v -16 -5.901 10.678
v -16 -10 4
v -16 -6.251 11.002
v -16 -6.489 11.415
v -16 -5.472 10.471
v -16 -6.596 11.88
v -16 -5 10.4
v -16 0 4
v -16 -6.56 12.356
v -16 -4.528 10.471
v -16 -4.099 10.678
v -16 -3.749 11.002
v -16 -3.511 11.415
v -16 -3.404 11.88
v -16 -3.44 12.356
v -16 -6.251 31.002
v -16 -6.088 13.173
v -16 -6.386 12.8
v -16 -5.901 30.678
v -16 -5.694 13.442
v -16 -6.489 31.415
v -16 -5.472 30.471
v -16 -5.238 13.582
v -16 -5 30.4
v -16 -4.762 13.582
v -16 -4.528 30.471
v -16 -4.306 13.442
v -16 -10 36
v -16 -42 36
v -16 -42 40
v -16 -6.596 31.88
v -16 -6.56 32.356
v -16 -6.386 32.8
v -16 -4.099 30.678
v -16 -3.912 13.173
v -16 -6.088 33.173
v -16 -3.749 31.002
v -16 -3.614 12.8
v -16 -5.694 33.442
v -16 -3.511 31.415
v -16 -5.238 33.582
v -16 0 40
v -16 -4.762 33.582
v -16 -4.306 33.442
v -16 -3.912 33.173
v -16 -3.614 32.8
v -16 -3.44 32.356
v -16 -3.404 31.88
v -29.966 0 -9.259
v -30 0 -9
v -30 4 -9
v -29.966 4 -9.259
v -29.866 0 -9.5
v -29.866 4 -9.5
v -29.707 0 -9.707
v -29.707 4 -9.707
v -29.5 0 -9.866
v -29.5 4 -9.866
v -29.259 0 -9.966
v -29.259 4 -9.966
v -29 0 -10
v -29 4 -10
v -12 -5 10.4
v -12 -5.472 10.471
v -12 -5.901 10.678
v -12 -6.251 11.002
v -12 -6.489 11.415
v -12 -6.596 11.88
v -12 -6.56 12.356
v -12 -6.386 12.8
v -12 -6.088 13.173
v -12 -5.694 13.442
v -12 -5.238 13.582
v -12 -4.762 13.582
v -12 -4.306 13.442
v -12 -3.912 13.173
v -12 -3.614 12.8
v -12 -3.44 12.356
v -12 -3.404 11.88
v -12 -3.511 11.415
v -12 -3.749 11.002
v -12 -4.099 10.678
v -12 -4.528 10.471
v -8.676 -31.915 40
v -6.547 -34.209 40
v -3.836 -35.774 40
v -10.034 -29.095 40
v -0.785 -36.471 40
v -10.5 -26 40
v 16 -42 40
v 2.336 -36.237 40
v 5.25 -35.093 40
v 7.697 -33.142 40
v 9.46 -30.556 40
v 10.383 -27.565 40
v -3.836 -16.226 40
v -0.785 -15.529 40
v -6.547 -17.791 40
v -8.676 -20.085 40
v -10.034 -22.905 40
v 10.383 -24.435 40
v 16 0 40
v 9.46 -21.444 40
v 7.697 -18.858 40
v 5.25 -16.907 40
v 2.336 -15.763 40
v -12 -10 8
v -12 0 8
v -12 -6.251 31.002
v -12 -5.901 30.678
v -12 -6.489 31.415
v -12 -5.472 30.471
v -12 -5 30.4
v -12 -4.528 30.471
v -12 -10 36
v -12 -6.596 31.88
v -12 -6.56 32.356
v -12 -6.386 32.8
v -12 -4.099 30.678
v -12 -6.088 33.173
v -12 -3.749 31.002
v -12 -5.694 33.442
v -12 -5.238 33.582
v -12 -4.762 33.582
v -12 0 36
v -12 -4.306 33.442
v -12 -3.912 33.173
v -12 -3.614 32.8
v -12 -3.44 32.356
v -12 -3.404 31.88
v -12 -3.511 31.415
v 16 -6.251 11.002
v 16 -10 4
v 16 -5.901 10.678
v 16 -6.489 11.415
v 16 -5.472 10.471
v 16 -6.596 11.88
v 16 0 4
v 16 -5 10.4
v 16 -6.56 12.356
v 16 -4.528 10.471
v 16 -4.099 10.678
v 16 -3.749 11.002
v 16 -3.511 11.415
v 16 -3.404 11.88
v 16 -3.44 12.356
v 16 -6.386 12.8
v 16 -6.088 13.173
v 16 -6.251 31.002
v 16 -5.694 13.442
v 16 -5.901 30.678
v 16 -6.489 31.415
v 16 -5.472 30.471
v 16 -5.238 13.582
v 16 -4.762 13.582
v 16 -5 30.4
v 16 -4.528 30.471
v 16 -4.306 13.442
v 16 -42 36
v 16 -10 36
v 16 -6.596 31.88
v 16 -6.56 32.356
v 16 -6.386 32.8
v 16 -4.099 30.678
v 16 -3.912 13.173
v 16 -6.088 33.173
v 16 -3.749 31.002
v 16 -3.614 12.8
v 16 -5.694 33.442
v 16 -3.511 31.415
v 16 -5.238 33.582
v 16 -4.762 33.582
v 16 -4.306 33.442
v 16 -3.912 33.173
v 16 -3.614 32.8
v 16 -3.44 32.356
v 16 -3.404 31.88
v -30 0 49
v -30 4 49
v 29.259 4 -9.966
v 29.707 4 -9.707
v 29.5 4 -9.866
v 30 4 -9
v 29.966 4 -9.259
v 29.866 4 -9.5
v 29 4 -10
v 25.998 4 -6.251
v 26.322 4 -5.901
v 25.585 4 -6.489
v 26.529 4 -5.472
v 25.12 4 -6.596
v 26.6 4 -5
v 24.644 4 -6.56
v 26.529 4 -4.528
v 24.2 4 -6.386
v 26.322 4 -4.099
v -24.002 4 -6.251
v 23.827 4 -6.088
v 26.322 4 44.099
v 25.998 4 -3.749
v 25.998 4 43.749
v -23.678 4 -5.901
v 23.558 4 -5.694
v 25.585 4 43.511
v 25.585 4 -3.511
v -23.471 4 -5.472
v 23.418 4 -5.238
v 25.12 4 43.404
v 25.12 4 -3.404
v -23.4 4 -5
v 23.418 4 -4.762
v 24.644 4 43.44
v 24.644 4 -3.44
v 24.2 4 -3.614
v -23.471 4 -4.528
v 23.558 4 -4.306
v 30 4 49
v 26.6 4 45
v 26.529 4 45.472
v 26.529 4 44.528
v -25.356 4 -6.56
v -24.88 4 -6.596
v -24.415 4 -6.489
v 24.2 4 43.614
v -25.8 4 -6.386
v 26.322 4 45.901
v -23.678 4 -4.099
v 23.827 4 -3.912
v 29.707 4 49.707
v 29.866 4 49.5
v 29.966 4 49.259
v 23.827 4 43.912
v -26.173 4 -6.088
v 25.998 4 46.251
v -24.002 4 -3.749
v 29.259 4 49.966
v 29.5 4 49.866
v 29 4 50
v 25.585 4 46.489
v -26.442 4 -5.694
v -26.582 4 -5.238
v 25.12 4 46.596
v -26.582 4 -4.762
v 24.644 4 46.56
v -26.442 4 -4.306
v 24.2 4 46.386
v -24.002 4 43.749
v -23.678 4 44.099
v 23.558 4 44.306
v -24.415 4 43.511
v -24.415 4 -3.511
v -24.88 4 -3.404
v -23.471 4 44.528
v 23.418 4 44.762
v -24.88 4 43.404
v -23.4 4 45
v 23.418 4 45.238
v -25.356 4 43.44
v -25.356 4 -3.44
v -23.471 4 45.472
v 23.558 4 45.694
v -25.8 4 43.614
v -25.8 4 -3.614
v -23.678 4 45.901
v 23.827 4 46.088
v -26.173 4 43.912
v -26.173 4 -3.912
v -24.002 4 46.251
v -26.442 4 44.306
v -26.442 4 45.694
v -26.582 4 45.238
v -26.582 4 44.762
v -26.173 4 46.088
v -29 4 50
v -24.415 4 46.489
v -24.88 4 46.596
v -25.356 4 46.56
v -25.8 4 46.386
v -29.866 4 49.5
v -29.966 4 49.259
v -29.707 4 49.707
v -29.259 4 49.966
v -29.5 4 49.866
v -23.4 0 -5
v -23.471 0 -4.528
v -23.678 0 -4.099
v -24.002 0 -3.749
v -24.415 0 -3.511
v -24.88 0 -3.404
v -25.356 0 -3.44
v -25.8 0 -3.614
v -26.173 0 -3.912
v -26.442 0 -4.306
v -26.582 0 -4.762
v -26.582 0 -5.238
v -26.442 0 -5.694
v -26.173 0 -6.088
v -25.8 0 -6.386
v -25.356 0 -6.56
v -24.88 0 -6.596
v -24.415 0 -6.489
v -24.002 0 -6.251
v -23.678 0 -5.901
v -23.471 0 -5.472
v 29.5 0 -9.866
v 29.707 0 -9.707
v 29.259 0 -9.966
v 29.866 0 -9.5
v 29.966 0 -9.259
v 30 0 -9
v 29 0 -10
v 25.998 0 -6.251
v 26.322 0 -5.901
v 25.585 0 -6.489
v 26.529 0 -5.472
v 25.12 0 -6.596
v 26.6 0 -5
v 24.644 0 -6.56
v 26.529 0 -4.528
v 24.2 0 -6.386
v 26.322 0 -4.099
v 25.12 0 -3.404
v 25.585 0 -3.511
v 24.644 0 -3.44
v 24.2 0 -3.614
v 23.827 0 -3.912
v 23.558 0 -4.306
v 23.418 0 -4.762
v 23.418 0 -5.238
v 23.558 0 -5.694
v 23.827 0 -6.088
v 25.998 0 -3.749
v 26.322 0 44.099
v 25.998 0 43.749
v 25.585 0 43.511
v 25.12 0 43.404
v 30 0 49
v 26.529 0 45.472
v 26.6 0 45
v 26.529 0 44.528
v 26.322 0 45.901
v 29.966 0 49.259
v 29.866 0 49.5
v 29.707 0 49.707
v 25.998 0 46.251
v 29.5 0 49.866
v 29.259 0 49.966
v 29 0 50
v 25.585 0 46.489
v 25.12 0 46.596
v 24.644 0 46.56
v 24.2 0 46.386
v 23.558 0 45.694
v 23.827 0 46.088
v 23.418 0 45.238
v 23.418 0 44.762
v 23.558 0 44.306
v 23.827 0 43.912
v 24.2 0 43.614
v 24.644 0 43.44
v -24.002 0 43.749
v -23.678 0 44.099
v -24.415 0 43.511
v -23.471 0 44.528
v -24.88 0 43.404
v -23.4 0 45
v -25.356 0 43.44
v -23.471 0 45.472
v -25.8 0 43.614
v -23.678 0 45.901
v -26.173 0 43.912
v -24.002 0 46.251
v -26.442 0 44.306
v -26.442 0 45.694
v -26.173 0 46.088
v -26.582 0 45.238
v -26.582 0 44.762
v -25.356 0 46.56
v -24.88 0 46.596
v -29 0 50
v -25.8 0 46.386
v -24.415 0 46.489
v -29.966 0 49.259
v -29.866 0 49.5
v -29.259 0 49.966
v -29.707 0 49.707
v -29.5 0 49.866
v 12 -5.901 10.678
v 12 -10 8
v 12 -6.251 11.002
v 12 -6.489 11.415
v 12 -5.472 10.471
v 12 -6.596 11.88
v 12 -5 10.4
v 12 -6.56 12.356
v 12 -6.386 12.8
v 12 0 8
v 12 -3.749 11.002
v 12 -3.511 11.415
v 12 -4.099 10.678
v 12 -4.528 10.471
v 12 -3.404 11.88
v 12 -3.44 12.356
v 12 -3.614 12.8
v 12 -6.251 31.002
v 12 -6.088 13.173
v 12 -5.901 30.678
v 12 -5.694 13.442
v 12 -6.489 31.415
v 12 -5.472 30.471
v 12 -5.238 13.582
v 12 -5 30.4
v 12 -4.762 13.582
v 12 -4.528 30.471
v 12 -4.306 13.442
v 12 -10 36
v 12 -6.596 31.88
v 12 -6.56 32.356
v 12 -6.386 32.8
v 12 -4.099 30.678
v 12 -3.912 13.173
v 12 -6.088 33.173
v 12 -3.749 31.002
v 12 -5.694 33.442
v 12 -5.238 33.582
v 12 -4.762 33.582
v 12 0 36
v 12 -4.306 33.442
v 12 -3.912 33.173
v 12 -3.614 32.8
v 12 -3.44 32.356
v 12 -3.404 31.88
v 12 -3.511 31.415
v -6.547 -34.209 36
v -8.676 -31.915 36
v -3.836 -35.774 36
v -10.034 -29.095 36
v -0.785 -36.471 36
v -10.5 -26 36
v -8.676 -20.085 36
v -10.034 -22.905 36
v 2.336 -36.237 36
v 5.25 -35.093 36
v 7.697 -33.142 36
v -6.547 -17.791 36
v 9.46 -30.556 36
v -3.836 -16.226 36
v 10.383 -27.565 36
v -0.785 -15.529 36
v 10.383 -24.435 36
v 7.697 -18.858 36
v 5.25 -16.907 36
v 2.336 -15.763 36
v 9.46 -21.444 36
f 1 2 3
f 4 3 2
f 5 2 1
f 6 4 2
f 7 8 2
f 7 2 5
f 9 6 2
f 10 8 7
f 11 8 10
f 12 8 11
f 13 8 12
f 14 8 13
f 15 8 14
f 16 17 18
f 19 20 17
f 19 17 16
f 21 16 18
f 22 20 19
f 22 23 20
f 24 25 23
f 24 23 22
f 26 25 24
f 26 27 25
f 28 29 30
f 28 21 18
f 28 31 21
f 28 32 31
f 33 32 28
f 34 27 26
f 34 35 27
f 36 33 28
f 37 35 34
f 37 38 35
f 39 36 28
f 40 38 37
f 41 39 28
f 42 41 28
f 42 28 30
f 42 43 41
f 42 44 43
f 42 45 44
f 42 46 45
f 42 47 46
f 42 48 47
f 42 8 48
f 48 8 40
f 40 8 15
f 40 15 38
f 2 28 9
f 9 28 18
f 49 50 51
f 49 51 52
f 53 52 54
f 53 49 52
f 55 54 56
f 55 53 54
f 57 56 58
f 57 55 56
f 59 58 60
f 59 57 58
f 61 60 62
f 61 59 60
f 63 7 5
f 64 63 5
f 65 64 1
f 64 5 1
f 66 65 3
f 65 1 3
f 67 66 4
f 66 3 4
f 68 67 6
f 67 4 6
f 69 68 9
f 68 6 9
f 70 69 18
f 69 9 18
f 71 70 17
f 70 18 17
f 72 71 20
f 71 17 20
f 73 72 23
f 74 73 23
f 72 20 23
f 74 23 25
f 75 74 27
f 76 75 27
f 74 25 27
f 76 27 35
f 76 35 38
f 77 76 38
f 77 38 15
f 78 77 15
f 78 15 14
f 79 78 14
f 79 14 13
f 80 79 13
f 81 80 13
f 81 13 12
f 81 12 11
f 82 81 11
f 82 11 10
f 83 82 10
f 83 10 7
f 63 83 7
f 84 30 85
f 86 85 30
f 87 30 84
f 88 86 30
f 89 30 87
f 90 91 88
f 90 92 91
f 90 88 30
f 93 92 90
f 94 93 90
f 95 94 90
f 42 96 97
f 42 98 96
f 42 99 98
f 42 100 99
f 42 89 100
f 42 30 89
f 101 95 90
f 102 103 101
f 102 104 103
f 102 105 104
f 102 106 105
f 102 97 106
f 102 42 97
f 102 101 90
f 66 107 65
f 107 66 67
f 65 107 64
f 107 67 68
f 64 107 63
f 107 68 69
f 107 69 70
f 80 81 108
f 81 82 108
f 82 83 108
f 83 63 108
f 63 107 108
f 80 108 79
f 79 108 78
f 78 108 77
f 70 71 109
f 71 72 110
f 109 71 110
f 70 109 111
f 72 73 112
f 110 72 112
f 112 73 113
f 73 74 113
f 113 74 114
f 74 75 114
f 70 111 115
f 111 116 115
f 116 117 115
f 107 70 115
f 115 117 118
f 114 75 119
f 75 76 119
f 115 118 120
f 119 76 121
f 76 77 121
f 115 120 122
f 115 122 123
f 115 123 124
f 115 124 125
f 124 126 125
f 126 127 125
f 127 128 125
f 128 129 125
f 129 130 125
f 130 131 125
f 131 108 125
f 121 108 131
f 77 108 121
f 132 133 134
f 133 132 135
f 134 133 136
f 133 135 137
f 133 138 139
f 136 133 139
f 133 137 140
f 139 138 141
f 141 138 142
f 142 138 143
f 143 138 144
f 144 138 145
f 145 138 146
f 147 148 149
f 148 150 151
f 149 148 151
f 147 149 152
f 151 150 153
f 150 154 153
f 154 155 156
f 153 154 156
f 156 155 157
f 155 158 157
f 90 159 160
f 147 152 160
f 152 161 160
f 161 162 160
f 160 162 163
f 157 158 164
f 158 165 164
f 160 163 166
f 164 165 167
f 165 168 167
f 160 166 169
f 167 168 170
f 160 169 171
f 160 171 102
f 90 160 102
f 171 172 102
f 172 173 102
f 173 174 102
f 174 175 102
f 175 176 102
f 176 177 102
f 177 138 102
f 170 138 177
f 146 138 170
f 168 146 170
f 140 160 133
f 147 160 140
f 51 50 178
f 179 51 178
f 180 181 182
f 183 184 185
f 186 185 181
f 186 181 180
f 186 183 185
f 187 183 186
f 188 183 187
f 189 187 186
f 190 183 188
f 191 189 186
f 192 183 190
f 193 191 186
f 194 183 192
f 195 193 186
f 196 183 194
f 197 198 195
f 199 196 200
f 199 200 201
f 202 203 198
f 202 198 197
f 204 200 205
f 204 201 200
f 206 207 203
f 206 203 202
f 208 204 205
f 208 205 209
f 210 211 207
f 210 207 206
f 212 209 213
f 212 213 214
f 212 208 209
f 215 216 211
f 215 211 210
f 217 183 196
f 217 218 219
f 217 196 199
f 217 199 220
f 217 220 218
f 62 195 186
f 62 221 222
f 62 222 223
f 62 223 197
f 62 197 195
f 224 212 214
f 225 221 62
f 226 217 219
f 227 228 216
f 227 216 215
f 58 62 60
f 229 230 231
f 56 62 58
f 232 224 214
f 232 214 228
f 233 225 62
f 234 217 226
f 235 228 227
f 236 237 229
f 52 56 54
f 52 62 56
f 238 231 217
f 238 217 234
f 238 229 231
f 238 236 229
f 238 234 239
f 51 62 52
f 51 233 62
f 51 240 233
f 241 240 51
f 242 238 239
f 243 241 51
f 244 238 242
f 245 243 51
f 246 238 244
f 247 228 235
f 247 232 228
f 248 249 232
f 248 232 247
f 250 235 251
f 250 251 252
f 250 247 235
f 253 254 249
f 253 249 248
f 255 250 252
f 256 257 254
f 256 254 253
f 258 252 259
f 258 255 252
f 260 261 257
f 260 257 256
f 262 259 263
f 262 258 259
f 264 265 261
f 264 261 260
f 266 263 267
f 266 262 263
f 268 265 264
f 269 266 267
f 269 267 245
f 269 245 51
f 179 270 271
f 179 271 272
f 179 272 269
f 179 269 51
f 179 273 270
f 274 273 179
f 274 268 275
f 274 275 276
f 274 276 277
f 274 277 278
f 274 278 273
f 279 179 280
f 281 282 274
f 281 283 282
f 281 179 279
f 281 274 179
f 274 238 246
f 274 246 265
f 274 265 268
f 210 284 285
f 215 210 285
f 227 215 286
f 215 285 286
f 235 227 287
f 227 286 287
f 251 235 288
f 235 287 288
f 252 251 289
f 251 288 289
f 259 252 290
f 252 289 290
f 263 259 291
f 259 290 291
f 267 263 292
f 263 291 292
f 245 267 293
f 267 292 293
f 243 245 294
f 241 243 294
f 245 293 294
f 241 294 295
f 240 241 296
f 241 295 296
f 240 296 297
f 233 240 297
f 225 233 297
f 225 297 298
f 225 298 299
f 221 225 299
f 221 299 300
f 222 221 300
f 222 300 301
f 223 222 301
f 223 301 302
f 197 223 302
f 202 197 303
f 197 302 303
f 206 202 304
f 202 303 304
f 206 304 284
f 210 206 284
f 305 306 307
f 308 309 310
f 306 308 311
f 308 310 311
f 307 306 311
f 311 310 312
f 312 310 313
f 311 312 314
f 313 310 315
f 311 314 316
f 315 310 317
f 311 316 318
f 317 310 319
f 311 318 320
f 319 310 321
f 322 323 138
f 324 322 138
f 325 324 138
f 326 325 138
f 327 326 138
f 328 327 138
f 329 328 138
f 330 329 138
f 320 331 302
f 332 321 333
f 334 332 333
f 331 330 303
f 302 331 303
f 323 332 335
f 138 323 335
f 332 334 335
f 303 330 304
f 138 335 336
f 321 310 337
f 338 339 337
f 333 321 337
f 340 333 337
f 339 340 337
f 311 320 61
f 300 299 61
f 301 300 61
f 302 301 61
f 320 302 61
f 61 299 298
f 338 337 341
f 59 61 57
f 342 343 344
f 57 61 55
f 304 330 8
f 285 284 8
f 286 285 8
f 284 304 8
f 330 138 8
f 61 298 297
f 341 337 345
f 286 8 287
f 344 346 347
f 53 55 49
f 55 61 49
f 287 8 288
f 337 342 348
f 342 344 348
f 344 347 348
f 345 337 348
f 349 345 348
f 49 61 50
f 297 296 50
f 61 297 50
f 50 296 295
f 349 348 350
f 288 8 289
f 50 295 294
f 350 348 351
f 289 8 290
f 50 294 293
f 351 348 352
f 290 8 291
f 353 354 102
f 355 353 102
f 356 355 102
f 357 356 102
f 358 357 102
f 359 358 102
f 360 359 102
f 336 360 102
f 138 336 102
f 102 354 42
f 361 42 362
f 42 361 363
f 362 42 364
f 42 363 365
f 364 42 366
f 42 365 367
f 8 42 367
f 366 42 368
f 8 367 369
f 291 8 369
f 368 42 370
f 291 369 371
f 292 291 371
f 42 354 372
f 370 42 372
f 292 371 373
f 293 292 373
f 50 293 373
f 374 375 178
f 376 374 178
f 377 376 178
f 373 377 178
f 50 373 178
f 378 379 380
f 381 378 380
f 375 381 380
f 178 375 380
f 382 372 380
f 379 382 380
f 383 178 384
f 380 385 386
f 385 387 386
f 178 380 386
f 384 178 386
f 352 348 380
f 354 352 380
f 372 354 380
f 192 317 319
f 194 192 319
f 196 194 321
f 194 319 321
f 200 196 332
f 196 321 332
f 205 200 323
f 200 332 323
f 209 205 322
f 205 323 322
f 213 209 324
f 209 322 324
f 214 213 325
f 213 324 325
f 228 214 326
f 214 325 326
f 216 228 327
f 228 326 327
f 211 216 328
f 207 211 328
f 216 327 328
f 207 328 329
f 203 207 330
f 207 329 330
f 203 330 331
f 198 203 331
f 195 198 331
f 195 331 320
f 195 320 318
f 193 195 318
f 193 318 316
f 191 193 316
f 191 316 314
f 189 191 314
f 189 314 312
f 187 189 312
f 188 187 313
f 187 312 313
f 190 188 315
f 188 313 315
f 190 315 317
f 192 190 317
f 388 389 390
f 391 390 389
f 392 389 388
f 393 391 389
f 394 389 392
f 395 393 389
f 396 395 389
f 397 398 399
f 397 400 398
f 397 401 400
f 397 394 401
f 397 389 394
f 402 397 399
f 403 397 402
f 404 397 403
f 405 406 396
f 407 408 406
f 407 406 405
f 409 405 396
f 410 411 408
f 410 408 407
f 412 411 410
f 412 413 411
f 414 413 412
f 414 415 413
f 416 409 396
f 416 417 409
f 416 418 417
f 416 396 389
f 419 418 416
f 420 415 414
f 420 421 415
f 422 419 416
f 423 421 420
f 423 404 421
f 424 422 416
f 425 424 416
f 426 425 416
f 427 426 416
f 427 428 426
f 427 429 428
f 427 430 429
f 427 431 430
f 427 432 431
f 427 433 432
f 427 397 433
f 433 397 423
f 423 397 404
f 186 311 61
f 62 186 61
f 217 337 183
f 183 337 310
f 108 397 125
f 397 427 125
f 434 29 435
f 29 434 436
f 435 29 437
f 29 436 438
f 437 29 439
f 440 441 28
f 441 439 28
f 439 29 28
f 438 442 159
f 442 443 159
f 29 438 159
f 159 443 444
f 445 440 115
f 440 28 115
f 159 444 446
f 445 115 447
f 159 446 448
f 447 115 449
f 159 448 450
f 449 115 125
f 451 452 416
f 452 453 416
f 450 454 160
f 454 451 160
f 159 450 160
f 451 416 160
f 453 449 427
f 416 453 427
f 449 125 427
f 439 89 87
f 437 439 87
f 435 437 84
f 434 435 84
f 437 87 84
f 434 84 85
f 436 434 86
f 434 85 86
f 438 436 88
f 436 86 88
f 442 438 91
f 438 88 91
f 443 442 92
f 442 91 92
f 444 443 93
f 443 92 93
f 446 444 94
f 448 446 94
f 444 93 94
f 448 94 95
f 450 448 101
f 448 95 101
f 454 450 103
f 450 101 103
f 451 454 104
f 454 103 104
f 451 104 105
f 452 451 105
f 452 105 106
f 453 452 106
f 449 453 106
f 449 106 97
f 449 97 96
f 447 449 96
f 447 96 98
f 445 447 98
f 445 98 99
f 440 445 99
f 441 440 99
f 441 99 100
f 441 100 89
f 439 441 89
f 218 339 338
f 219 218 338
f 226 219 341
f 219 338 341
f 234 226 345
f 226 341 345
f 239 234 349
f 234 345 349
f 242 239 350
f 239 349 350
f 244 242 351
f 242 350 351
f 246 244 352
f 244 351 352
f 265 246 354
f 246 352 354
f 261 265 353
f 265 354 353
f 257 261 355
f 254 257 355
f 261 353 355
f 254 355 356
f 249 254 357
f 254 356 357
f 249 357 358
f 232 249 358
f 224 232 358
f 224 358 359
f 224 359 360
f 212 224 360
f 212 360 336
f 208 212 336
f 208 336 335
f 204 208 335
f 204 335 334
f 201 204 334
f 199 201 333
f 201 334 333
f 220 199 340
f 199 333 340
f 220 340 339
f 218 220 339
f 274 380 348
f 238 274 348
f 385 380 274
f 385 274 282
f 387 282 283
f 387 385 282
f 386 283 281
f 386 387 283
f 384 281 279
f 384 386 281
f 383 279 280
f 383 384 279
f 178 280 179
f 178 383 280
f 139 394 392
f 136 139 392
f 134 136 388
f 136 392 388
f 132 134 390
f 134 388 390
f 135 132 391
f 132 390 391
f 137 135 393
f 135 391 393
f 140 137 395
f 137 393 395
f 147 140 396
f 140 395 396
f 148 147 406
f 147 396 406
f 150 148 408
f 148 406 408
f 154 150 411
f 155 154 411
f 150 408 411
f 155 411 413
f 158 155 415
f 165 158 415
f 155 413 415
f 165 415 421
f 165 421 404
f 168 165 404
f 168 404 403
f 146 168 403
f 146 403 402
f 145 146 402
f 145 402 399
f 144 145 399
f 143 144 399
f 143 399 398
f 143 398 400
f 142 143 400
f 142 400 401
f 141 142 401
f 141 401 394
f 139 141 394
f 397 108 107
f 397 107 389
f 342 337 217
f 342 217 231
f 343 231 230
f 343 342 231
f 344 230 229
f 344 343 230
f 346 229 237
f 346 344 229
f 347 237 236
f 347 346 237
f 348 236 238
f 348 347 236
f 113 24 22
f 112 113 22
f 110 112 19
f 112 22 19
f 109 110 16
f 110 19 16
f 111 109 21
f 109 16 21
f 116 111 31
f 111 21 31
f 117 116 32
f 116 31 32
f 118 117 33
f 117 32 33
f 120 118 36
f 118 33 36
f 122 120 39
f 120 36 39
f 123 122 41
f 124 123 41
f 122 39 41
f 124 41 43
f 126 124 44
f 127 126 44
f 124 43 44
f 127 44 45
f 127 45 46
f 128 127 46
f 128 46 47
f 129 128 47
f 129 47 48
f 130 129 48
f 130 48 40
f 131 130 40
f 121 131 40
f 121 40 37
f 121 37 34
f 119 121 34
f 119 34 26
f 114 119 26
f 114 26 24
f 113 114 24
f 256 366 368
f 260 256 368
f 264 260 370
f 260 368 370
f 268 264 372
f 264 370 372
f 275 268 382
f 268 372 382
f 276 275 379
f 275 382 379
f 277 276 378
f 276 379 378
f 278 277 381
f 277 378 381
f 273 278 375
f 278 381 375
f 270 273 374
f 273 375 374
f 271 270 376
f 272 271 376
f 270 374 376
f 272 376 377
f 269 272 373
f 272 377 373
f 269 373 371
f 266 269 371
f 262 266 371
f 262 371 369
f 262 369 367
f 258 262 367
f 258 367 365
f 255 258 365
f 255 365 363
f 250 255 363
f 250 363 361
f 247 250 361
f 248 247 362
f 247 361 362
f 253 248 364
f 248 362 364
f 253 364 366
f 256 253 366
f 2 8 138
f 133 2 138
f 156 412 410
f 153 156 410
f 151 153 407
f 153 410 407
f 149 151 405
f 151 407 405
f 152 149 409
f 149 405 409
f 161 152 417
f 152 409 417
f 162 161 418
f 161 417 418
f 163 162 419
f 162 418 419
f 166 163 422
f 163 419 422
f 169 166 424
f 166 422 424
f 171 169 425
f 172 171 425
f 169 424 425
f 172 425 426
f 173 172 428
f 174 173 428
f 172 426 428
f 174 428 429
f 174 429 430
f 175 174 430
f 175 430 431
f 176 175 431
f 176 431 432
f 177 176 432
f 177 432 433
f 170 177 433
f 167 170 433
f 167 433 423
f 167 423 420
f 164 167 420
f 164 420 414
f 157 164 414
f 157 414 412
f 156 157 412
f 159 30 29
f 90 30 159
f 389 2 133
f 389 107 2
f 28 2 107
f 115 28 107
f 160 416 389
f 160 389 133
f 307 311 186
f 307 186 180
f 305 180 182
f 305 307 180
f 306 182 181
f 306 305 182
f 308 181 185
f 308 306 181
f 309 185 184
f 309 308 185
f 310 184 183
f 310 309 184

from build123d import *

# Parameters (mm, degrees)
SKETCH002_R     = 1.6
PAD002_DEPTH    = 4
SKETCH007_W     = 32
SKETCH007_H     = 36
SKETCH007_W_2   = 24
SKETCH007_H_2   = 28
PAD006_DEPTH    = 10
SKETCH008_R     = 1.6
POCKET_DEPTH    = 46.001
SKETCH020_W     = 32
SKETCH020_H     = 4
PAD015_DEPTH    = 32
SKETCH021_R     = 10.5
POCKET004_DEPTH = 5


with BuildPart() as part:
    # Sketch002 → Pad002 (new body)
    with BuildSketch(Plane.XZ):
        with BuildLine():
            Line((-29, 50), (29, 50))
            ThreePointArc((30, 49), (29.707107, 49.707107), (29, 50))
            Line((30, 49), (30, -9))
            ThreePointArc((29, -10), (29.707107, -9.707107), (30, -9))
            Line((29, -10), (-29, -10))
            ThreePointArc((-30, -9), (-29.707107, -9.707107), (-29, -10))
            Line((-30, -9), (-30, 49))
            ThreePointArc((-29, 50), (-29.707107, 49.707107), (-30, 49))
        make_face()
        with Locations((-25, -5)):
            Circle(SKETCH002_R, mode=Mode.SUBTRACT)
        with Locations((-25, 45)):
            Circle(SKETCH002_R, mode=Mode.SUBTRACT)
        with Locations((25, 45)):
            Circle(SKETCH002_R, mode=Mode.SUBTRACT)
        with Locations((25, -5)):
            Circle(SKETCH002_R, mode=Mode.SUBTRACT)
    extrude(amount=-PAD002_DEPTH)

    # Sketch007 (on Face13 of Pad002) → Pad006 (join)
    with BuildSketch(Plane.XZ):
        with Locations((0, 22)):
            Rectangle(SKETCH007_W, SKETCH007_H)
        with Locations((0, 22)):
            Rectangle(SKETCH007_W_2, SKETCH007_H_2, mode=Mode.SUBTRACT)
    extrude(amount=PAD006_DEPTH)

    # Sketch008 (on Face17 of Pad006) → Pocket (cut, through all)
    with BuildSketch(Plane(origin=(-16, 0, 0), x_dir=(0, 0, -1), z_dir=(-1, 0, 0))):
        with Locations((-32, 5)):
            Circle(SKETCH008_R)
        with Locations((-12, 5)):
            Circle(SKETCH008_R)
    extrude(amount=-POCKET_DEPTH, mode=Mode.SUBTRACT)

    # Sketch020 (on Face19 of Pocket) → Pad015 (join)
    with BuildSketch(Plane.XZ.offset(10)):
        with Locations((0, 38)):
            Rectangle(SKETCH020_W, SKETCH020_H)
    extrude(amount=PAD015_DEPTH)

    # Sketch021 (on Face19 of Pad015) → Pocket004 (cut)
    with BuildSketch(Plane(origin=(0, 0, 40), x_dir=(-1, 0, 0), z_dir=(0, 0, 1))):
        with Locations((0, 26)):
            Circle(SKETCH021_R)
    extrude(amount=-POCKET004_DEPTH, mode=Mode.SUBTRACT)


solid = part.part
